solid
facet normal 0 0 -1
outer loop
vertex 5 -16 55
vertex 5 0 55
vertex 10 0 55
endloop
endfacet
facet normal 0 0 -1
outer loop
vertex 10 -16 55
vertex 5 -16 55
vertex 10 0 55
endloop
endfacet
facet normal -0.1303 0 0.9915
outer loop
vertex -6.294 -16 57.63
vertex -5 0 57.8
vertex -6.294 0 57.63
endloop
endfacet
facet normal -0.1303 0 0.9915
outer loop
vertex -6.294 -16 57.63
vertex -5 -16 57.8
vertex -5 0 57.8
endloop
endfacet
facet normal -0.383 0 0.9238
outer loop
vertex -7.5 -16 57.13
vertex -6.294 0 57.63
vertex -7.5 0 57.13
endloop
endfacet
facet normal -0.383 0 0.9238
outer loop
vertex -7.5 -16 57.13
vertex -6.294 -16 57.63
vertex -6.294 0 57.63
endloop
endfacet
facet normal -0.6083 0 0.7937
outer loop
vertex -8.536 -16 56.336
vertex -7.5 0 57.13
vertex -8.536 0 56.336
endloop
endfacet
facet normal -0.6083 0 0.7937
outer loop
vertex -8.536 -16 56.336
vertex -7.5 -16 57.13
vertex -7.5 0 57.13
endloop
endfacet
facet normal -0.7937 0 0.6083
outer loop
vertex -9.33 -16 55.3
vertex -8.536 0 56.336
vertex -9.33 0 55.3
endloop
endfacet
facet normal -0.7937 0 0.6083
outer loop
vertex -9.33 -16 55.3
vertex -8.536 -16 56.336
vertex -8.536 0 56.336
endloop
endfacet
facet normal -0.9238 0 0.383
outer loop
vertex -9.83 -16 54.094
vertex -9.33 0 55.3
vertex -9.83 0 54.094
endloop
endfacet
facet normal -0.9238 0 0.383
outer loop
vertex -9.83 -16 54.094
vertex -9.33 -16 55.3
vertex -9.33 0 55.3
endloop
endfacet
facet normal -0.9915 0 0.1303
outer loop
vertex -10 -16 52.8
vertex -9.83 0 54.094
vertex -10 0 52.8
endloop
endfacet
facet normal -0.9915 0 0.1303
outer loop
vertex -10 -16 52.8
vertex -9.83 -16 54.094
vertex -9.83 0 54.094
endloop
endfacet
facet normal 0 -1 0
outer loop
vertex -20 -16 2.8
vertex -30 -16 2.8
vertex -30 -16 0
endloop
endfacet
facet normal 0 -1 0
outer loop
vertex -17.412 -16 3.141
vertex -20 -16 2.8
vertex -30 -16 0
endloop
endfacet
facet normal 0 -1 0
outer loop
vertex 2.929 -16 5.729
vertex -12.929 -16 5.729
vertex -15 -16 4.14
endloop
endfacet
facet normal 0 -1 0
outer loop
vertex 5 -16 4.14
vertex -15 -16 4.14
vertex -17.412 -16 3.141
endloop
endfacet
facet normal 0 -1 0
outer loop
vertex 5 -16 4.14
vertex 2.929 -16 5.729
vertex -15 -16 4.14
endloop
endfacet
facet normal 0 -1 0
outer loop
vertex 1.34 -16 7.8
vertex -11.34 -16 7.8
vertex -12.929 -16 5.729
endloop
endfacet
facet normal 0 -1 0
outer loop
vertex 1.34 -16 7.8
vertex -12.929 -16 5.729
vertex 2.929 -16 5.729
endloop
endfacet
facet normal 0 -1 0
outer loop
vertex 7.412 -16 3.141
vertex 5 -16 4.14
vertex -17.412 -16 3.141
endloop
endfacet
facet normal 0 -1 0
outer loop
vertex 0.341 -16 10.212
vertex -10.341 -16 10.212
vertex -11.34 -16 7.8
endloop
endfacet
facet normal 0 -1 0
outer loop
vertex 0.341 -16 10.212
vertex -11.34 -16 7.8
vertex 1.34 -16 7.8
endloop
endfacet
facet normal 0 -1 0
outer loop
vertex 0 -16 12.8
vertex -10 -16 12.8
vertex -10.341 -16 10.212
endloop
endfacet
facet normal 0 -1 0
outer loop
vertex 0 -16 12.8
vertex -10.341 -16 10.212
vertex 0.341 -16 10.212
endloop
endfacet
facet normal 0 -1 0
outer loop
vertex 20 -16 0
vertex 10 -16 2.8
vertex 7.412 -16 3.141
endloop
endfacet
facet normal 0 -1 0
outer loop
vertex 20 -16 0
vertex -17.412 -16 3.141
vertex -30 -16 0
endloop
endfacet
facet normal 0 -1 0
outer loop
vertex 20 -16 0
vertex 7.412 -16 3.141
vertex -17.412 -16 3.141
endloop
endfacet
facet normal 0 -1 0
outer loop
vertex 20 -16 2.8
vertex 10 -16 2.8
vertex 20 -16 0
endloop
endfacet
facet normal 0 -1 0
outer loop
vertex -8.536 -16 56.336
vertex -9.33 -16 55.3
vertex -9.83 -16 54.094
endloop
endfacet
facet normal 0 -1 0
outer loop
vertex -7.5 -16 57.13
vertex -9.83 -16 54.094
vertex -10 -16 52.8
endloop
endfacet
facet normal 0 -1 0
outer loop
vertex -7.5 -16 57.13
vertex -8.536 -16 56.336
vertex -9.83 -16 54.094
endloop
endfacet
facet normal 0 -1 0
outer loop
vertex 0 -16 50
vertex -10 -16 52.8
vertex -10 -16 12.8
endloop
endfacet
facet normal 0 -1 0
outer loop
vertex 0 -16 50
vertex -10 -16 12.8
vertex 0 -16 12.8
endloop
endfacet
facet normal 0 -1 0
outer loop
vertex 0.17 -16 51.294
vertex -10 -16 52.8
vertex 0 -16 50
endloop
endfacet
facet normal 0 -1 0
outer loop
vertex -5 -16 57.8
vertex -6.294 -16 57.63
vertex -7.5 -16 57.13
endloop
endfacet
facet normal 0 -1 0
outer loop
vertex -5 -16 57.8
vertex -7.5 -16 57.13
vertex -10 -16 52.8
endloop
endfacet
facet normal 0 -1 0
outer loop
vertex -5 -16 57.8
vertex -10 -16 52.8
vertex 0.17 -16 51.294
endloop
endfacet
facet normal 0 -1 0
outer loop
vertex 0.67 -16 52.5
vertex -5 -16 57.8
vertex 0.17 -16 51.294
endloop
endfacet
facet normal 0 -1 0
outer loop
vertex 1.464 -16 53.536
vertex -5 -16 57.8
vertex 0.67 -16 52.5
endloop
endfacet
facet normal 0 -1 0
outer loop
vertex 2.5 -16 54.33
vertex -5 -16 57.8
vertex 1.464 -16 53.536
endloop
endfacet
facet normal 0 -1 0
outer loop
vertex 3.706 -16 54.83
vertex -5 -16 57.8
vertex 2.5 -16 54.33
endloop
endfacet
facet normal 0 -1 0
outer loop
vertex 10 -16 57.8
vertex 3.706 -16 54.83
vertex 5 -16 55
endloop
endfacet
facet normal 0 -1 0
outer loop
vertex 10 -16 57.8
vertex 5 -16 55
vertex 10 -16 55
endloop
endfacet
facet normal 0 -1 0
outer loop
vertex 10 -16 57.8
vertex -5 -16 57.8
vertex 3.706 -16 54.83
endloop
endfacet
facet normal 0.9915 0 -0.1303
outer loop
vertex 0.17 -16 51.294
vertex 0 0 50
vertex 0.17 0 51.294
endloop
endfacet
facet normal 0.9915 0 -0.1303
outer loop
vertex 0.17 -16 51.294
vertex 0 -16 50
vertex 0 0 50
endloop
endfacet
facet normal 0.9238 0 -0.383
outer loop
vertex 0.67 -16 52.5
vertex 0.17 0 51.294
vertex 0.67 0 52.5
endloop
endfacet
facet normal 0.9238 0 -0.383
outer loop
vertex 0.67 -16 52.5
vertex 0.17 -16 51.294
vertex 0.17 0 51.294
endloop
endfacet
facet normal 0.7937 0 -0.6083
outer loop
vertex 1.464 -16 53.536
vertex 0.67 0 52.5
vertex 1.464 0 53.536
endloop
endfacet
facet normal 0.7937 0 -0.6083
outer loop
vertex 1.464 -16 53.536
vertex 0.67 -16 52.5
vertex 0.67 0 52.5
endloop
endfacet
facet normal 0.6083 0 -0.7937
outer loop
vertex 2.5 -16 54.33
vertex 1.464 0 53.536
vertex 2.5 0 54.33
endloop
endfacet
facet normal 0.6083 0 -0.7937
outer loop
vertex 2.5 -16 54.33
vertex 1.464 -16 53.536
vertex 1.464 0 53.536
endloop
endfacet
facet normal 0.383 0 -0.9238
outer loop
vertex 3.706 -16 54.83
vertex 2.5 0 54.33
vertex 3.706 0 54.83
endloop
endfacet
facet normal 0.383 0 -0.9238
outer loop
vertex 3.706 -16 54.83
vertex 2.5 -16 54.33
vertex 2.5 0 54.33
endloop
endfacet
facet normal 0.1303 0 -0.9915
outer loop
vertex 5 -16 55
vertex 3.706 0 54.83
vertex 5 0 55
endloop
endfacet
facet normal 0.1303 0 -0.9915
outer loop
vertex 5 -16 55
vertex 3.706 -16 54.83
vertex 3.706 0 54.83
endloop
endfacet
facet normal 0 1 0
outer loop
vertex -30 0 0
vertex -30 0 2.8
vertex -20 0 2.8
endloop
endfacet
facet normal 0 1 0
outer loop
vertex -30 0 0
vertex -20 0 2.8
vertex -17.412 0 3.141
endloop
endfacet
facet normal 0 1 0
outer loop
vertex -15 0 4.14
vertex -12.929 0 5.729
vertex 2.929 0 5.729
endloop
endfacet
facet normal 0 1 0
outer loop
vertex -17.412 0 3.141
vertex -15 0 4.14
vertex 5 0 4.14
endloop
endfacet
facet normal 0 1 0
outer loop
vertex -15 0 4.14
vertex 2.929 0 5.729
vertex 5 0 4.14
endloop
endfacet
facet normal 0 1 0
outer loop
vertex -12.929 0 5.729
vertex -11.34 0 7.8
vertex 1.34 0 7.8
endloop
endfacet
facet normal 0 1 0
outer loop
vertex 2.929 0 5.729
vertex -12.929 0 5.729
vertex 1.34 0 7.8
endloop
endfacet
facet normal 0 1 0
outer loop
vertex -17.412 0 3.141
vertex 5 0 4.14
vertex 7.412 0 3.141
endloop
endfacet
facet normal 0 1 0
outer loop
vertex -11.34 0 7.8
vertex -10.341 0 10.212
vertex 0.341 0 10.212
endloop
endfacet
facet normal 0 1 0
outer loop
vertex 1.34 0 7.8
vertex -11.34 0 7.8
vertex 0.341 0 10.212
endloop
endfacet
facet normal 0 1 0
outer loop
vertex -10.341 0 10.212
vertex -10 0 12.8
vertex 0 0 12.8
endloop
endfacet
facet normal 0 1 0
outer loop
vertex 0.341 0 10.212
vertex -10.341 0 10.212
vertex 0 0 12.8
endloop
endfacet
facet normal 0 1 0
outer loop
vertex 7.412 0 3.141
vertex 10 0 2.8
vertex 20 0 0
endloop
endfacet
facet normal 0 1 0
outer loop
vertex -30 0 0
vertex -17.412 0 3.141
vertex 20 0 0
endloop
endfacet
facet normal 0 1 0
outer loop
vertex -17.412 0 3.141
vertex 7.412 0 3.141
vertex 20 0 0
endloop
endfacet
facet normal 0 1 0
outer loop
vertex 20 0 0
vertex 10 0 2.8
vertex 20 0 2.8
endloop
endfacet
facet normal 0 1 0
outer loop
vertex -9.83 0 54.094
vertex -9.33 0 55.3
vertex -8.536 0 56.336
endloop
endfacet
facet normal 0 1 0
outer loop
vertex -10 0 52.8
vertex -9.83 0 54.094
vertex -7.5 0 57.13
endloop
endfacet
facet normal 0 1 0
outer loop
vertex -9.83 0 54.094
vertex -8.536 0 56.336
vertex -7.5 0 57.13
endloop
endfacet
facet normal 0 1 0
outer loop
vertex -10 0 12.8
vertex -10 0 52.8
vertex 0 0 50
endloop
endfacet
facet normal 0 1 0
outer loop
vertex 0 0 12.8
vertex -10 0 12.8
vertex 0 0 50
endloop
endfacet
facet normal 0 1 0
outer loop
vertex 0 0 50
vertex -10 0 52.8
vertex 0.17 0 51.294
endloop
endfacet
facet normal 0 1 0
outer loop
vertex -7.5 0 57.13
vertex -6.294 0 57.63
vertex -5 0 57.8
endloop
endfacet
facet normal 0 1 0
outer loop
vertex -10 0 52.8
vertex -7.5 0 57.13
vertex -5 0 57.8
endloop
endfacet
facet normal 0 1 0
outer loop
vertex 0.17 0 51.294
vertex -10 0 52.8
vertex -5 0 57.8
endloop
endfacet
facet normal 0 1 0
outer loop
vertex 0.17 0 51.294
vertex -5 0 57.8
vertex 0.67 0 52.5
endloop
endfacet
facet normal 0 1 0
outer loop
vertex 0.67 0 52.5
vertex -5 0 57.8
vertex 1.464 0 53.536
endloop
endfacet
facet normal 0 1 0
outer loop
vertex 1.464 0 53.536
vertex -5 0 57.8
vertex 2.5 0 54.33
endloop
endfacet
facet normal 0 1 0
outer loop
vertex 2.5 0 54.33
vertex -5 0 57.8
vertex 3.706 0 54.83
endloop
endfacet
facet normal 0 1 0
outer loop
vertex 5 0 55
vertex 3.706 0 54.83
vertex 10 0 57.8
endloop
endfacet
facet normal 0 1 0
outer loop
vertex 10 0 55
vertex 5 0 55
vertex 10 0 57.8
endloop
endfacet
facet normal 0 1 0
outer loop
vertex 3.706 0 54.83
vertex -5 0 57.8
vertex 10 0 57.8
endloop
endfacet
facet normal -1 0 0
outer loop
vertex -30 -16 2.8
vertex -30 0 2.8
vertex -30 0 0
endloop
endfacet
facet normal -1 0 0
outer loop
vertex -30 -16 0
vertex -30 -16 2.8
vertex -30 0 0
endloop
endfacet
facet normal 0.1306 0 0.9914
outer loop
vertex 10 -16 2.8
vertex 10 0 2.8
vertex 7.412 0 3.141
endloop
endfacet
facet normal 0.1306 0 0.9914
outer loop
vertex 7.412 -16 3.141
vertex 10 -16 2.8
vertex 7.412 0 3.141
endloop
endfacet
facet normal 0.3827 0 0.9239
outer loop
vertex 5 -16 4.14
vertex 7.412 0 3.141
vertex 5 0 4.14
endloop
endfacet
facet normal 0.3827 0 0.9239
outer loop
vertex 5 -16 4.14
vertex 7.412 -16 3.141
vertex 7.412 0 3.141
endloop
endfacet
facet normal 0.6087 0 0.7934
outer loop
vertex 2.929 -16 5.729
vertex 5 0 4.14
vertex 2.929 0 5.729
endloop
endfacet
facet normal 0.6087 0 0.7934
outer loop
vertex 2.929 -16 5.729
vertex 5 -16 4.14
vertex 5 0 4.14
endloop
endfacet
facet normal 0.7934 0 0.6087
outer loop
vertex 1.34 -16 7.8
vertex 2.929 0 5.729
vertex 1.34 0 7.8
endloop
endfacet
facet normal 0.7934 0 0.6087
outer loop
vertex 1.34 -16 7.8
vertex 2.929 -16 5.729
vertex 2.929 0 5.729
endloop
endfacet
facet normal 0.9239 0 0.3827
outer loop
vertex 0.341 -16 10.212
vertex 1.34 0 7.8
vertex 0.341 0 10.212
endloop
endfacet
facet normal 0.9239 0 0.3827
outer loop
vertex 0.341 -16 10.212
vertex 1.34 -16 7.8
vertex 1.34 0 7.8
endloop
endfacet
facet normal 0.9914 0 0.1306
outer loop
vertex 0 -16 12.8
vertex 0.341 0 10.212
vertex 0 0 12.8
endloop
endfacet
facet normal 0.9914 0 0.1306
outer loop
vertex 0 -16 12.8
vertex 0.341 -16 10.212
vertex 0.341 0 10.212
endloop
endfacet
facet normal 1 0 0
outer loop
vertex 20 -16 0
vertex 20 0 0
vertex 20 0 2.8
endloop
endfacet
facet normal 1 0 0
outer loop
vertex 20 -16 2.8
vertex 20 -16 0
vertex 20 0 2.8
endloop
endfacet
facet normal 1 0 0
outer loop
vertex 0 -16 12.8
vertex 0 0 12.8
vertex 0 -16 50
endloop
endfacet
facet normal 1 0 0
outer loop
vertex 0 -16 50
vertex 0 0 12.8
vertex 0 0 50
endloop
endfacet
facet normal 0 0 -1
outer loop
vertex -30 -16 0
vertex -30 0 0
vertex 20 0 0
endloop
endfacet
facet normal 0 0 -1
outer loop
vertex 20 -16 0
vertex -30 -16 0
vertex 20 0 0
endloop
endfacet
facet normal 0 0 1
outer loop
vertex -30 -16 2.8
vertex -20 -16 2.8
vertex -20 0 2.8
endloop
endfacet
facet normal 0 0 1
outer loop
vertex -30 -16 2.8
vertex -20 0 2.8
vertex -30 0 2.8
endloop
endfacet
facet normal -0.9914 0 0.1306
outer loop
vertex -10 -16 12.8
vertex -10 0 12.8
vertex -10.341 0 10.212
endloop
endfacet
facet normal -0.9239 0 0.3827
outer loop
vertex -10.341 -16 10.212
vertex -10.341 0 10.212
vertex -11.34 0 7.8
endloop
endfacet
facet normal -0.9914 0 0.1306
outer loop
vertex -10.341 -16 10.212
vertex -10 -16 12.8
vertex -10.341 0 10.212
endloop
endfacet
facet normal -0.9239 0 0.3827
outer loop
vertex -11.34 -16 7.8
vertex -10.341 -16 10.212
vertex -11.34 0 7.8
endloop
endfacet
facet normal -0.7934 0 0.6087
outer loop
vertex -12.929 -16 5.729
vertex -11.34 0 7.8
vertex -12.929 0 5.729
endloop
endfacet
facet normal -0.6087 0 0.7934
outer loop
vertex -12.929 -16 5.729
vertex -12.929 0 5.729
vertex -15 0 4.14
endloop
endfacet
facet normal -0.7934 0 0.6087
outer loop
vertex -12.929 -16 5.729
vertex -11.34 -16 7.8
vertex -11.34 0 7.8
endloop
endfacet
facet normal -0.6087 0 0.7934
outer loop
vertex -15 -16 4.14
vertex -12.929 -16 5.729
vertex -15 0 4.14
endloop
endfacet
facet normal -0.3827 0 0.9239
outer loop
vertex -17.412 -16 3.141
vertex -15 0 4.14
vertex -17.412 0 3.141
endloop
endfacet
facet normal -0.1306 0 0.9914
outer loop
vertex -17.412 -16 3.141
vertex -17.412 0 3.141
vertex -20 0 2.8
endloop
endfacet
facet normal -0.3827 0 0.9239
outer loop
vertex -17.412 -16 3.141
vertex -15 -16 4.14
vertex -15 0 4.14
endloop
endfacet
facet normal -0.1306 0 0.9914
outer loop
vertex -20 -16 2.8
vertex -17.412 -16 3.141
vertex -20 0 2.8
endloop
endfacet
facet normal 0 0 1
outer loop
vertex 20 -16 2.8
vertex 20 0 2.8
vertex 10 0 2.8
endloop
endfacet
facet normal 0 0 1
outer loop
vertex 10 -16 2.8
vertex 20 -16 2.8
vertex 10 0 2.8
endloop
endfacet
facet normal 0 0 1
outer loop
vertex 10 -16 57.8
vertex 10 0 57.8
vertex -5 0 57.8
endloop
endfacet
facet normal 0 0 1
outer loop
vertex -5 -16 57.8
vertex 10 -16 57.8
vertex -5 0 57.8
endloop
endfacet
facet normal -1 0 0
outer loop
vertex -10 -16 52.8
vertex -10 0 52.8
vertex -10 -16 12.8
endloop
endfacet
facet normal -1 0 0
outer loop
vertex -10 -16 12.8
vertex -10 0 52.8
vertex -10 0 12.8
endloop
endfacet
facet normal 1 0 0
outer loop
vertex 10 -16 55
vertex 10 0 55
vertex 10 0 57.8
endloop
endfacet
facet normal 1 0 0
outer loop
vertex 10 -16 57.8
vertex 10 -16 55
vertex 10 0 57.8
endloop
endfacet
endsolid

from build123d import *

# Parameters (mm, degrees)
F0_W     = 20
F0_H     = 2.8
F1_DEPTH = 16
F2_R     = 10
F3_R     = 5


with BuildPart() as f1:
    # F0 (on Front) → F1 (new body)
    with BuildSketch(Plane.XZ):
        Polygon((-30, 0), (0, 0), (0, 2.8), (-10, 2.8), (-30, 2.8), align=None)
        with Locations((10, 1.4)):
            Rectangle(F0_W, F0_H)
        Polygon((-10, 2.8), (0, 2.8), (0, 55), (10, 55), (10, 57.8), (-10, 57.8), align=None)
    extrude(amount=F1_DEPTH)

    # F2
    f2_edges = [f1.edges().sort_by_distance(p)[0] for p in [
        (-10, -8, 2.8),
        (0, -8, 2.8),
    ]]
    fillet(f2_edges, radius=F2_R)

    # F3
    f3_edges = [f1.edges().sort_by_distance(p)[0] for p in [
        (-10, -8, 57.8),
        (0, -8, 55),
    ]]
    fillet(f3_edges, radius=F3_R)


solid = f1.part
